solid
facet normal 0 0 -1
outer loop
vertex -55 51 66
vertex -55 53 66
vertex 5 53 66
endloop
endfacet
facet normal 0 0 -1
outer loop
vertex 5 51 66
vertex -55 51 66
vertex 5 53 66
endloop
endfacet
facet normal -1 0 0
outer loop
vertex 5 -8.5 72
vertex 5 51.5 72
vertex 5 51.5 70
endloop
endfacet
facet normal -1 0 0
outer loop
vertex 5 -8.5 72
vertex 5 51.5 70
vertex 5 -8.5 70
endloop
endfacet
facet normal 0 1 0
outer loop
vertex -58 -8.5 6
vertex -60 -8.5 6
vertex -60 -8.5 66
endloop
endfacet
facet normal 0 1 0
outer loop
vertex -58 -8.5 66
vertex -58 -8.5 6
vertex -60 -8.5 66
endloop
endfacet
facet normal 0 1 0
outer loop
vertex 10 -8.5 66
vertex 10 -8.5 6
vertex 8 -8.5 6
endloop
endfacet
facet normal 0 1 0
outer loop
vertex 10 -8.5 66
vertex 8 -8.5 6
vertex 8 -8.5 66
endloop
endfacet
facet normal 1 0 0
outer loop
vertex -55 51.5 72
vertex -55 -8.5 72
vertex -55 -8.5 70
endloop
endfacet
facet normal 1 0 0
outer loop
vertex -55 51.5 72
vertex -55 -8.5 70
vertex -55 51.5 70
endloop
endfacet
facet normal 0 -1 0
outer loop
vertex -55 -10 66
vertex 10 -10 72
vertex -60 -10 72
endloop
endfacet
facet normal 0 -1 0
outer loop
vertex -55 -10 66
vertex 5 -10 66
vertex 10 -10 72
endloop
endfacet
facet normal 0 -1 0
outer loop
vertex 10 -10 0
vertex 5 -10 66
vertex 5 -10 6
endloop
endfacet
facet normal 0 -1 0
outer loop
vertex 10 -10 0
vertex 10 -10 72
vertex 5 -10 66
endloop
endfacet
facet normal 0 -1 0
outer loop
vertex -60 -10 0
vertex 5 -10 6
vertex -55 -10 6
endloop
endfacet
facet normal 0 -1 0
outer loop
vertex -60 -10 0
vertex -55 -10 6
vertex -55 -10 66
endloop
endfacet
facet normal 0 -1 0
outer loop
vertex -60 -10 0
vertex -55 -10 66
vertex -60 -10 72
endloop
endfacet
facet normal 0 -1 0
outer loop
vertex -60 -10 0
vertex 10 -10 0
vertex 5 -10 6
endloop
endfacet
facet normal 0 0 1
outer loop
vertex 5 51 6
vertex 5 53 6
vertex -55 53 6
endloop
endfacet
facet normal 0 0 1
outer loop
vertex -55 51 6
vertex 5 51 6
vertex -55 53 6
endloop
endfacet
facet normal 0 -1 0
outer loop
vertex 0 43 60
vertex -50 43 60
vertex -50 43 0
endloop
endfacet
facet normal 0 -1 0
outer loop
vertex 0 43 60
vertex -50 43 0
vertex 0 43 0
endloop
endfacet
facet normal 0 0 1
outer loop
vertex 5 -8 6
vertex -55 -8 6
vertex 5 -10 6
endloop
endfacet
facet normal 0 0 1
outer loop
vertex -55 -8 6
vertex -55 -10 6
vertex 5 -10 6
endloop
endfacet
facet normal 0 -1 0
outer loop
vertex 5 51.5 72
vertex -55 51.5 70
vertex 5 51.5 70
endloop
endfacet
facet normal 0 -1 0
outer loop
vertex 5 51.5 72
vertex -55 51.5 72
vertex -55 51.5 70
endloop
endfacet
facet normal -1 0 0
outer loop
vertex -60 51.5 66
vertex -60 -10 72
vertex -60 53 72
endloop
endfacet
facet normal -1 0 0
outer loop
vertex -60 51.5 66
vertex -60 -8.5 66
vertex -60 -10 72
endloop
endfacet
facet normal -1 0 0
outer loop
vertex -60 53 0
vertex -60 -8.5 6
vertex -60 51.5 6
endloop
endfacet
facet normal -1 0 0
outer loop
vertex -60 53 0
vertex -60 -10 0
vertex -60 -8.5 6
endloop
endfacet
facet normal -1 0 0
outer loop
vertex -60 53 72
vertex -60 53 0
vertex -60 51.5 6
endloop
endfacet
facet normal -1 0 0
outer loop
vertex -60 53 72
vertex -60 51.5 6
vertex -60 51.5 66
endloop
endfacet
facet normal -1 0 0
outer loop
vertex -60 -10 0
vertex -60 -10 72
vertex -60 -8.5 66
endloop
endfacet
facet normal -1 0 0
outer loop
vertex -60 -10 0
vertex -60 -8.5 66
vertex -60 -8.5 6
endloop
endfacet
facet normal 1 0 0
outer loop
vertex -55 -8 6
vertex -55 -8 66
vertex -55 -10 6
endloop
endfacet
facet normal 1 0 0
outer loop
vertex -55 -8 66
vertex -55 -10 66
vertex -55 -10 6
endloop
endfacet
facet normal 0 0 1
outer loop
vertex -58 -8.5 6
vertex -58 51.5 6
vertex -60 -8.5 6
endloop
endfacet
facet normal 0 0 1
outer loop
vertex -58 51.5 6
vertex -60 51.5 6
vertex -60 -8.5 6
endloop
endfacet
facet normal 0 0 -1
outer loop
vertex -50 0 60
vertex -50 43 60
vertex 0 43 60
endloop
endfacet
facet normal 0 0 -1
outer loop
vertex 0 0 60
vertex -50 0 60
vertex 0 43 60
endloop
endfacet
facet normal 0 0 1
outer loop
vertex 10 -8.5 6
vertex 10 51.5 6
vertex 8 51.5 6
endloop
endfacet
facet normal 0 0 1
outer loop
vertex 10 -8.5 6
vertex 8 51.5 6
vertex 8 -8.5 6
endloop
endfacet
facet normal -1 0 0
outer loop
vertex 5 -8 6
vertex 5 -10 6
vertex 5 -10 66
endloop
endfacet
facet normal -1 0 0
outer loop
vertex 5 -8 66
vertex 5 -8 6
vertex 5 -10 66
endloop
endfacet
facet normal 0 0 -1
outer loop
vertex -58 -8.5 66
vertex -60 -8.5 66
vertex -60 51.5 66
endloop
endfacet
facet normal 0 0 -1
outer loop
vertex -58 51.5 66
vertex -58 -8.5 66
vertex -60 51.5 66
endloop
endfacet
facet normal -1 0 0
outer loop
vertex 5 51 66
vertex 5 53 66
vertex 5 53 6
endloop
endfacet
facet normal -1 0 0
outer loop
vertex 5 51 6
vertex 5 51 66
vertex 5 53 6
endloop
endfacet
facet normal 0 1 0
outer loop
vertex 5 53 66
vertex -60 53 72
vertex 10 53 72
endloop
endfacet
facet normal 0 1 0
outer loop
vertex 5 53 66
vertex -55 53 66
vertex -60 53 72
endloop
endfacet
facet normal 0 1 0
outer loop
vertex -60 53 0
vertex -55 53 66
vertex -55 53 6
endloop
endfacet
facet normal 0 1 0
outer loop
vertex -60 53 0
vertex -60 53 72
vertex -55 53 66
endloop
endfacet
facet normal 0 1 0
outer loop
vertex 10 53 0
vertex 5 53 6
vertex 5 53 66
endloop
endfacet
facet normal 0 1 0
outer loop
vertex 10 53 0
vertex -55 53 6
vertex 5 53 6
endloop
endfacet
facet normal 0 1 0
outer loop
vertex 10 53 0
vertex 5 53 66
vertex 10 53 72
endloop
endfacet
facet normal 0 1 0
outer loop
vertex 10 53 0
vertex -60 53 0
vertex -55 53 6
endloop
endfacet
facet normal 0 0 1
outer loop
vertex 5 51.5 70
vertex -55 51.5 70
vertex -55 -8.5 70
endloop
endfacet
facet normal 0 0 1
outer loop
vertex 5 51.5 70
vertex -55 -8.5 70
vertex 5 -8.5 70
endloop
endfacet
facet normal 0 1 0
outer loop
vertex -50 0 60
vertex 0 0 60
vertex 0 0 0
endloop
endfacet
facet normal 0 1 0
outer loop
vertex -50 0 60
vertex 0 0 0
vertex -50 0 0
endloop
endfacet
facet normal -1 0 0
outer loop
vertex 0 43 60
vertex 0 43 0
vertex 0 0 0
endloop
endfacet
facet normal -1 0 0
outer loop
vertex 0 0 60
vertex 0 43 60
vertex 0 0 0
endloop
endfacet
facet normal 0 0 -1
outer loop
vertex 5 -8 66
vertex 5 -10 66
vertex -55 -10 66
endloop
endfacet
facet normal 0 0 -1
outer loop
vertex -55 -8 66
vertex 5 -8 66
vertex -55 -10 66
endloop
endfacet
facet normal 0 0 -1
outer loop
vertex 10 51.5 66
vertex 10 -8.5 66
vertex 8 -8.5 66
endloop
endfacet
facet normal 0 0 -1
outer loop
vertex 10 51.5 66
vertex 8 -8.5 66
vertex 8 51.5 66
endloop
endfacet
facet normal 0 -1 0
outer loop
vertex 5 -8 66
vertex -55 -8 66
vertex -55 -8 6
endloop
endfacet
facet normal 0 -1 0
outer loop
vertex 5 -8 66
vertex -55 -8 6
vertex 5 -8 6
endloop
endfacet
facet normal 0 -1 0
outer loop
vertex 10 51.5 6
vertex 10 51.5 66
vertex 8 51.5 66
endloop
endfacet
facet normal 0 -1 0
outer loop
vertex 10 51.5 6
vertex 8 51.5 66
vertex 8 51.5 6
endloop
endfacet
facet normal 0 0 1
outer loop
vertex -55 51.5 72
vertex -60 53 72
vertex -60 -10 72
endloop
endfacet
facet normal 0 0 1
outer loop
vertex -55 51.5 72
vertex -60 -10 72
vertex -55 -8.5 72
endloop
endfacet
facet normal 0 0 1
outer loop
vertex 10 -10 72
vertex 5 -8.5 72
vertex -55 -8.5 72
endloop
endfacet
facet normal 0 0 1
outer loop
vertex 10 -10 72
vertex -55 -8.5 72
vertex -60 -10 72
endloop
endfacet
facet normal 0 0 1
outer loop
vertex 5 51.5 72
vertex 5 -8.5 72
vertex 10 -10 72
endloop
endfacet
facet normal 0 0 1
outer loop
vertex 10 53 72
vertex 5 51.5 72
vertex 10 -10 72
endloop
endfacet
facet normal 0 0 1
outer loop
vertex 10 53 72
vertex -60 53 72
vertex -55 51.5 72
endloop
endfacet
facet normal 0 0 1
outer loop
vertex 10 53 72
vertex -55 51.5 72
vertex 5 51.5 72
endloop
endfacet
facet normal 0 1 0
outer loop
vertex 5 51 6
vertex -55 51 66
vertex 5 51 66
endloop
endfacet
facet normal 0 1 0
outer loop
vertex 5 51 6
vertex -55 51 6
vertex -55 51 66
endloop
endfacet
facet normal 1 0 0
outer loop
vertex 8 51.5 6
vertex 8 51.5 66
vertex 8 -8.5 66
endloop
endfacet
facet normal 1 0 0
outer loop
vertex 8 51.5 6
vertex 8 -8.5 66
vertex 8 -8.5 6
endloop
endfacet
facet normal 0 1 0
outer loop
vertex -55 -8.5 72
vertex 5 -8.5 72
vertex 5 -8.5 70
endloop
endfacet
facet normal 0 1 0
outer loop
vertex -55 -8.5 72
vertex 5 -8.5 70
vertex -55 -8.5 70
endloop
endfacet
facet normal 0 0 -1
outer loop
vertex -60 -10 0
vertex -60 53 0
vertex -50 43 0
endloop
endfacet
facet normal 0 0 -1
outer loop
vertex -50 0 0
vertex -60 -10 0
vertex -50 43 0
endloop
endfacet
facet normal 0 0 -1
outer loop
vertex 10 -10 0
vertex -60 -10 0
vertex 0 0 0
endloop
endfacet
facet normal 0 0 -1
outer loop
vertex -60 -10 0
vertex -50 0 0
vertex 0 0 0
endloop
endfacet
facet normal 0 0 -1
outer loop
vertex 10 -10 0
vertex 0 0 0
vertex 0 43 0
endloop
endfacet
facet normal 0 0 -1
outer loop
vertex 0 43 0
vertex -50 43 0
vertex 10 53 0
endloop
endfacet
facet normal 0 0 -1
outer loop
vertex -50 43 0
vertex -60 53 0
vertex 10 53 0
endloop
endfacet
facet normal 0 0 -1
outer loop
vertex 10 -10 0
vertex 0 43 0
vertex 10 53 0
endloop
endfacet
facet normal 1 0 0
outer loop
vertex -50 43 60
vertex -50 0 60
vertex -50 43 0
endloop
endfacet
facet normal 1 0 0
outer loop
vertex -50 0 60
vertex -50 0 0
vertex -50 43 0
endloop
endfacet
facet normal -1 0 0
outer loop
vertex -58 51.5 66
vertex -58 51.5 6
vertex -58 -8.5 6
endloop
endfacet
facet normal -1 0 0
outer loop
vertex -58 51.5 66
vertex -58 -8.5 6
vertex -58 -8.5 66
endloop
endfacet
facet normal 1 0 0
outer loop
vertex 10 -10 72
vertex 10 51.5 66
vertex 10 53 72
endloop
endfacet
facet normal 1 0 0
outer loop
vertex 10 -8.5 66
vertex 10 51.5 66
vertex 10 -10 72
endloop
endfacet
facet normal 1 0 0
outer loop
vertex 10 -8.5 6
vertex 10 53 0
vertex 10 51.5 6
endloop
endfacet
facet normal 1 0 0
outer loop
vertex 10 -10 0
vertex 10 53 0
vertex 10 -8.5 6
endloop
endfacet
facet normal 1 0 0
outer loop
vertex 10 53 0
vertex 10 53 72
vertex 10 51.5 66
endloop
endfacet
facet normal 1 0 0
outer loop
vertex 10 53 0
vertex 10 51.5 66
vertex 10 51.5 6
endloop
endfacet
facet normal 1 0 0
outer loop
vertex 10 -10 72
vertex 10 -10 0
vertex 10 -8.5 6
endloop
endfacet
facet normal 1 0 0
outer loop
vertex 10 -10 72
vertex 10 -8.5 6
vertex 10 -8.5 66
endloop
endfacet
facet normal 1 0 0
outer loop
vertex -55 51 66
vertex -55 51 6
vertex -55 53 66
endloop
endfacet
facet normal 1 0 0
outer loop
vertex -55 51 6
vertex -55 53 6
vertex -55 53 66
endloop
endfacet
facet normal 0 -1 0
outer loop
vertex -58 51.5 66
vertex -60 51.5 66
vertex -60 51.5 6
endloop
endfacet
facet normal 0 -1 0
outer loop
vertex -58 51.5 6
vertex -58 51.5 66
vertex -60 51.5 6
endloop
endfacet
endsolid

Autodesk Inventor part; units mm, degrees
ref_plane "YZ Plane" through (0, 0, 0) normal (1, 0, 0) x (0, 1, 0)
ref_plane "XZ Plane" through (0, 0, 0) normal (0, 1, 0) x (-1, 0, 0)
ref_plane "XY Plane" through (0, 0, 0) normal (0, 0, 1) x (1, 0, 0)
sketch "Sketch3" plane through (0, 0, 0) normal (0, 0, 1) x (1, 0, 0)
  line L0 (0, 0) -> (-50, 0)
  line L1 (-50, 0) -> (-50, 43)
  line L2 (-50, 43) -> (0, 43)
  line L3 (0, 43) -> (0, 0)
  line L4 (10, -10) -> (-60, -10)
  line L5 (-60, -10) -> (-60, 53)
  line L6 (-60, 53) -> (10, 53)
  line L7 (10, 53) -> (10, -10)
  dimension "d26" = 43
  dimension "d27" = 50
  dimension "d28" = 70
  dimension "d29" = 63
extrude "Extrusion3" add sketch "Sketch3" along normal blind 60
sketch "Sketch4" plane through (0, 0, 60) normal (0, 0, 1) x (1, 0, 0)
  line L0 (10, -10) -> (-60, -10)
  line L1 (-60, -10) -> (-60, 53)
  line L2 (-60, 53) -> (10, 53)
  line L3 (10, 53) -> (10, -10)
  point P0 (0, 0)
extrude "Extrusion4" add sketch "Sketch4" along normal blind 12
sketch "Sketch5" plane through (-60, 53, 0) normal (0, 1, 0) x (1, 0, 0)
  line L0 (0, 0) -> (70, 0) projected
  line L1 (70, 0) -> (70, -72) projected
  line L2 (0, 0) -> (70, 0)
  line L3 (70, 0) -> (70, -72)
  line L4 (70, -72) -> (0, -72)
  line L5 (0, -72) -> (0, 0)
  line L6 (65, -6) -> (5, -6)
  line L7 (5, -6) -> (5, -66)
  line L8 (5, -66) -> (65, -66)
  line L9 (65, -66) -> (65, -6)
  line L10 (60, -11) -> (10, -11)
  line L11 (10, -11) -> (10, -61)
  line L12 (10, -61) -> (60, -61)
  line L13 (60, -61) -> (60, -11)
  point P0 (60, 0)
  dimension "d34" = 60
  dimension "d35" = 60
  dimension "d36" = 50
  dimension "d37" = 50
extrude "Extrusion5" cut sketch "Sketch5" against normal blind 2 contours L9 L8 L7 L6 | L13 L12 L11 L10
sketch "Sketch6" plane through (10, -10, 0) normal (1, 0, 0) x (0, 0, -1)
  line L0 (-6, 1.5) -> (-66, 1.5)
  line L1 (-66, 1.5) -> (-66, 61.5)
  line L2 (-66, 61.5) -> (-6, 61.5)
  line L3 (-6, 61.5) -> (-6, 1.5)
  line L4 (-11, 6.5) -> (-61, 6.5)
  line L5 (-61, 6.5) -> (-61, 56.5)
  line L6 (-61, 56.5) -> (-11, 56.5)
  line L7 (-11, 56.5) -> (-11, 6.5)
  point P0 (0, 10)
  dimension "d40" = 60
  dimension "d41" = 60
  dimension "d42" = 50
  dimension "d43" = 50
extrude "Extrusion6" cut sketch "Sketch6" against normal blind 2 contours L0 L1 L2 L3 | L4 L5 L6 L7
sketch "Sketch7" plane through (-60, -10, 0) normal (0, -1, 0) x (1, 0, 0)
  line L0 (5, 6) -> (65, 6)
  line L1 (65, 6) -> (65, 66)
  line L2 (65, 66) -> (5, 66)
  line L3 (5, 66) -> (5, 6)
  line L4 (10, 11) -> (60, 11)
  line L5 (60, 11) -> (60, 61)
  line L6 (60, 61) -> (10, 61)
  line L7 (10, 61) -> (10, 11)
  point P0 (60, 0)
  dimension "d46" = 60
  dimension "d47" = 60
  dimension "d48" = 50
  dimension "d49" = 50
extrude "Extrusion7" cut sketch "Sketch7" against normal blind 2 contours L3 L2 L1 L0 | L7 L6 L5 L4
sketch "Sketch8" plane through (-60, -10, 0) normal (-1, 0, 0) x (0, 0, 1)
  line L0 (6, 1.5) -> (66, 1.5)
  line L1 (66, 1.5) -> (66, 61.5)
  line L2 (66, 61.5) -> (6, 61.5)
  line L3 (6, 61.5) -> (6, 1.5)
  line L4 (11, 6.5) -> (61, 6.5)
  line L5 (61, 6.5) -> (61, 56.5)
  line L6 (61, 56.5) -> (11, 56.5)
  line L7 (11, 56.5) -> (11, 6.5)
  point P0 (0, 10)
  dimension "d52" = 60
  dimension "d53" = 60
  dimension "d54" = 50
  dimension "d55" = 50
extrude "Extrusion8" cut sketch "Sketch8" against normal blind 2 contours L3 L2 L1 L0 | L7 L6 L5 L4
sketch "Sketch9" plane through (0, 0, 72) normal (0, 0, 1) x (1, 0, 0)
  line L0 (5, -8.5) -> (-55, -8.5)
  line L1 (-55, -8.5) -> (-55, 51.5)
  line L2 (-55, 51.5) -> (5, 51.5)
  line L3 (5, 51.5) -> (5, -8.5)
  line L4 (0, 46.5) -> (-50, 46.5)
  line L5 (-50, 46.5) -> (-50, -3.5)
  line L6 (-50, -3.5) -> (0, -3.5)
  line L7 (0, -3.5) -> (0, 46.5)
  point P0 (0, 0)
  dimension "d58" = 60
  dimension "d59" = 60
  dimension "d60" = 50
  dimension "d61" = 50
extrude "Extrusion9" cut sketch "Sketch9" against normal blind 2 contours L0 L1 L2 L3 | L7 L6 L5 L4
properties part number "End-Effector"
